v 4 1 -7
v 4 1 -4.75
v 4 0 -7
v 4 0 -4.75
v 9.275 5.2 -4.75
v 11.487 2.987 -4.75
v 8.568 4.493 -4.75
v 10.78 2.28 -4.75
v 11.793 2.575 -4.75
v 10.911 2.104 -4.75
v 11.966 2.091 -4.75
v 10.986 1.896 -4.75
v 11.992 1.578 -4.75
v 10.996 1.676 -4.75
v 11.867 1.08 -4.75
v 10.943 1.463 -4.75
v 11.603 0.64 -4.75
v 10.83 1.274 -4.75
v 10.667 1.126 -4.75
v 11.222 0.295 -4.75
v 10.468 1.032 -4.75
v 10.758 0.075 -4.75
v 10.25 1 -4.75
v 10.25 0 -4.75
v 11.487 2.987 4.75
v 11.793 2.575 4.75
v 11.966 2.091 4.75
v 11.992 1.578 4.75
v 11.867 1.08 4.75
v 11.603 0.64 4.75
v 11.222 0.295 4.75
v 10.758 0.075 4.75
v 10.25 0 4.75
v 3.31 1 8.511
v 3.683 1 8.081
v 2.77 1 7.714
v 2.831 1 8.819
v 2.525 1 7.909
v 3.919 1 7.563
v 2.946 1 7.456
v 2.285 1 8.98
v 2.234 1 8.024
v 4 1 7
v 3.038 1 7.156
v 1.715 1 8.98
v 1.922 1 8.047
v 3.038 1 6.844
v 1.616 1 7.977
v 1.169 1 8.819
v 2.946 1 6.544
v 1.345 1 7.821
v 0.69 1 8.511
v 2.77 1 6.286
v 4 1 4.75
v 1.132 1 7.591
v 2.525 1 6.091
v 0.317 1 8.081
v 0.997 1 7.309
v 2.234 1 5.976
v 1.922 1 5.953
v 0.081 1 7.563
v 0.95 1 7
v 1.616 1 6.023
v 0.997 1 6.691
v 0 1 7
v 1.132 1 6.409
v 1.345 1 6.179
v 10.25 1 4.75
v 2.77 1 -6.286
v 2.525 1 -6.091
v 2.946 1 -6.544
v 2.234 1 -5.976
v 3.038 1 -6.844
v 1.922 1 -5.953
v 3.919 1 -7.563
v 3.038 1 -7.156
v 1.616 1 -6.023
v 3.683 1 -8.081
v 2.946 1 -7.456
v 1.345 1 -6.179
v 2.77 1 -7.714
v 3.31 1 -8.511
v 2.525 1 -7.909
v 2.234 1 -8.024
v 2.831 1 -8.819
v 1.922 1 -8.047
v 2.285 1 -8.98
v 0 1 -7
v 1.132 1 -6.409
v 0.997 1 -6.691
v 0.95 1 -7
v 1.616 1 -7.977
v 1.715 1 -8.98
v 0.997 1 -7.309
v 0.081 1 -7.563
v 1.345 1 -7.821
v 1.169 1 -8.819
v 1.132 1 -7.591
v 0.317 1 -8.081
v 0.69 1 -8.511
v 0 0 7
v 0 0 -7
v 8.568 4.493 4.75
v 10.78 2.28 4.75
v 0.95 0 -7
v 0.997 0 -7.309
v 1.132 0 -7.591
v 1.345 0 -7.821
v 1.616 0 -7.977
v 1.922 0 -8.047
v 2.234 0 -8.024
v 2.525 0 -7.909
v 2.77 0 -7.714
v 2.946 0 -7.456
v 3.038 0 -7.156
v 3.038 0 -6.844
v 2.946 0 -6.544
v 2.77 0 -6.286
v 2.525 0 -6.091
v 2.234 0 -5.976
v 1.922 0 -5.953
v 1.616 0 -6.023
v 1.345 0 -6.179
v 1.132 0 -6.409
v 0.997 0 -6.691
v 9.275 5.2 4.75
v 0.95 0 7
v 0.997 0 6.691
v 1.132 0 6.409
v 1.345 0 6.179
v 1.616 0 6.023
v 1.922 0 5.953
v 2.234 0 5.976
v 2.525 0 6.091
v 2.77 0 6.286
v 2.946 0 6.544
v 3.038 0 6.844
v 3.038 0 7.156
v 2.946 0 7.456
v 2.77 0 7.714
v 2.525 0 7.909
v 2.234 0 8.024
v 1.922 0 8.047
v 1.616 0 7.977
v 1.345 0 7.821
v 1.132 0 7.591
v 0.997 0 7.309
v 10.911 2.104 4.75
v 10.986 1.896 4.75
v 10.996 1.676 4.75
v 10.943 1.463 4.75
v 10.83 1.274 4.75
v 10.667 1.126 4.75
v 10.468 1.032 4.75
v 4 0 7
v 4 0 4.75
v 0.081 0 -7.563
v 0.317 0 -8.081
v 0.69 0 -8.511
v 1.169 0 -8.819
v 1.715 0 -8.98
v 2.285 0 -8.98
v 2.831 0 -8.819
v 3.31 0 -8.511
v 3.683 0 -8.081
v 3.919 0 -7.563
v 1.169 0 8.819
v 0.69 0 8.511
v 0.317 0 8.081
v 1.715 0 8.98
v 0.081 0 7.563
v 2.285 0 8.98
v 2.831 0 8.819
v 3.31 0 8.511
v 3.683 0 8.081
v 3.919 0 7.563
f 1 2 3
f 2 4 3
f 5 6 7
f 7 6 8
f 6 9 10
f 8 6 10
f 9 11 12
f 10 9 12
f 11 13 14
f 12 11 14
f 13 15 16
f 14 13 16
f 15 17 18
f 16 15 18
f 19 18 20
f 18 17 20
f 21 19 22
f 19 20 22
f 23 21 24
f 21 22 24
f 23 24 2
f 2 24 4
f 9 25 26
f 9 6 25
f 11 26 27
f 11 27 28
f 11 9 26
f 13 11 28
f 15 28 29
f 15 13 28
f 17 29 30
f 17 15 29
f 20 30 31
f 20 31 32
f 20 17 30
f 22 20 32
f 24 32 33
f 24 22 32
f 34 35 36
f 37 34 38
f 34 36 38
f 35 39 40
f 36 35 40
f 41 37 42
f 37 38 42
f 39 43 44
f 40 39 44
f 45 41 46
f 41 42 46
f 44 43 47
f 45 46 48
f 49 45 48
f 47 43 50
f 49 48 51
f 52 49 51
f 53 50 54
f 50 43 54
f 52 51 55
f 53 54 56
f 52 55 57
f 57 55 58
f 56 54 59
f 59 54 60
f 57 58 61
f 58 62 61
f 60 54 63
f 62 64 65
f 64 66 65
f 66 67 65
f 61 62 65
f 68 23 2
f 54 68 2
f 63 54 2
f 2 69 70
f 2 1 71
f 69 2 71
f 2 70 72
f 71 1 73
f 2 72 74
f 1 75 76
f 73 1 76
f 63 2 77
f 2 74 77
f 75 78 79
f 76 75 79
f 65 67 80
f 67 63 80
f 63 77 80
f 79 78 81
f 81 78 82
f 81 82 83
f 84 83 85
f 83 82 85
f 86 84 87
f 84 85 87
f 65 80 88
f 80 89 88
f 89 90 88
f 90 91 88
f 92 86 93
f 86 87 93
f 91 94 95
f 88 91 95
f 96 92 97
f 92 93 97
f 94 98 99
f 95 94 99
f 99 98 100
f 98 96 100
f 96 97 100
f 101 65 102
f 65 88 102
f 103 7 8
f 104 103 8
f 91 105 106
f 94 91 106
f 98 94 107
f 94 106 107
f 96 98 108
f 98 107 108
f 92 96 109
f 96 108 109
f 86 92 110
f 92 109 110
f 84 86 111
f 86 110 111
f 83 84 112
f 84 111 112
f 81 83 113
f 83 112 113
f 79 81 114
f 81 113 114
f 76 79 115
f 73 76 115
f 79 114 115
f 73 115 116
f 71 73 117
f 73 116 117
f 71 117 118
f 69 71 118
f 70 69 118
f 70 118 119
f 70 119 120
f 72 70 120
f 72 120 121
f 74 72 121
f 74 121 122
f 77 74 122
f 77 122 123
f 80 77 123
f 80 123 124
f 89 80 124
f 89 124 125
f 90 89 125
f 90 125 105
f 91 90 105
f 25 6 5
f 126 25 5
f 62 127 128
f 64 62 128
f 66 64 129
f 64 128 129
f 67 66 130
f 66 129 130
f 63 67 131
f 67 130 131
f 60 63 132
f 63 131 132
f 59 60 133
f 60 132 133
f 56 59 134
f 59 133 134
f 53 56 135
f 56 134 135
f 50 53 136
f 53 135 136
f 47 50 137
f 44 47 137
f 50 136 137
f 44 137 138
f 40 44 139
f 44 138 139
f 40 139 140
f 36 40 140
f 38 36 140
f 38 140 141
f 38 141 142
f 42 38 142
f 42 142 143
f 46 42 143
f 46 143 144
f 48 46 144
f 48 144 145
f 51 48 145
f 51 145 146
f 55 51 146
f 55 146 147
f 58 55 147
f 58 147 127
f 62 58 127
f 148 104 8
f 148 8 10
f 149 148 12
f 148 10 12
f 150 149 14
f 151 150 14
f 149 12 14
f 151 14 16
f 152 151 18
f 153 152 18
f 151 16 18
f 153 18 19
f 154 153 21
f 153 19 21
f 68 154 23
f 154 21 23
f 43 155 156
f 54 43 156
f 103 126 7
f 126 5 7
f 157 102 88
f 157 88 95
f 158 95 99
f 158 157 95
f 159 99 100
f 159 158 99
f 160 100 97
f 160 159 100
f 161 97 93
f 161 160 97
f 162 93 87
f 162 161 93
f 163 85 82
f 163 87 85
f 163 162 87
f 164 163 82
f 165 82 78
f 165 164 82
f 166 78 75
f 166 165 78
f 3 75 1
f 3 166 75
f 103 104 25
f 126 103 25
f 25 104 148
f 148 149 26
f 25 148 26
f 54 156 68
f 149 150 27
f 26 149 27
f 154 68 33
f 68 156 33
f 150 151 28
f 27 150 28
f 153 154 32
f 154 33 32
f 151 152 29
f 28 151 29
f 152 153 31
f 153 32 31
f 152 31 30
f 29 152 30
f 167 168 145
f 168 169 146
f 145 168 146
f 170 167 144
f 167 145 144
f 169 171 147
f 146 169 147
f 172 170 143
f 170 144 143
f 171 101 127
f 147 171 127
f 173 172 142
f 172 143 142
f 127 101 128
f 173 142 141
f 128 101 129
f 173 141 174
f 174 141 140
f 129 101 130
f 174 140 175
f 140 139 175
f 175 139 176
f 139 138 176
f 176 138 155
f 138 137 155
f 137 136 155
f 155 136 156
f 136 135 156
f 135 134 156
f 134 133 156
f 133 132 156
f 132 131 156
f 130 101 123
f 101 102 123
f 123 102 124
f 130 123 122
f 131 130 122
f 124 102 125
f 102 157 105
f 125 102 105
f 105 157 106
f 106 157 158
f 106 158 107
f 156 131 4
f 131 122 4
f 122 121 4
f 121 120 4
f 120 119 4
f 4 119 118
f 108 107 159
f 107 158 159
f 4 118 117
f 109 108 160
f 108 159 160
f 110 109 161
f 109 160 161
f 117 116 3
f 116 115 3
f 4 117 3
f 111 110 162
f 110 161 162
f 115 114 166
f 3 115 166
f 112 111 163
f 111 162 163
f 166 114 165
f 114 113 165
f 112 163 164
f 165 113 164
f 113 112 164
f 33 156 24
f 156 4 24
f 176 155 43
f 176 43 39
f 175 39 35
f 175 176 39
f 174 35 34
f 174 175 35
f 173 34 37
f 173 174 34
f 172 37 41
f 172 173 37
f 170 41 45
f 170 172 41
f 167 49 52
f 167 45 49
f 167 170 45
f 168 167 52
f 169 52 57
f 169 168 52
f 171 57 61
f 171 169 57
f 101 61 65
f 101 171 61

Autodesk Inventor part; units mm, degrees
sketch "Sketch_1" plane through (0, 0, 0) normal (0, 0, 1) x (1, 0, 0)
  line L0 (0, 1) -> (0, 0)
  line L1 (0, 0) -> (10.25, 0)
  arc A0 (10.25, 0) -> (11.4874, 2.9874) centre (10.25, 1.75) ccw
  line L2 (11.4874, 2.9874) -> (9.2749, 5.2)
  line L3 (9.2749, 5.2) -> (8.5678, 4.4929)
  line L4 (8.5678, 4.4929) -> (10.7803, 2.2803)
  arc A1 (10.25, 1) -> (10.7803, 2.2803) centre (10.25, 1.75) ccw
  line L5 (10.25, 1) -> (0, 1)
extrude "Extrusion1" add sketch "Sketch_1" along normal mid plane 18
sketch "Sketch_2" plane through (0, 0, 0) normal (0, 1, 0) x (-1, 0, 0)
  line L0 (2, 11) -> (-16, 11)
  line L1 (-16, 11) -> (-16, -12)
  line L2 (-16, -12) -> (2, -12)
  line L3 (2, -12) -> (2, 11)
  line L4 (0, -7) -> (0, 7)
  arc A0 (0, 7) -> (-4, 7) centre (-2, 7) ccw
  line L5 (-4, 7) -> (-4, 4.75)
  line L6 (-4, 4.75) -> (-12, 4.75)
  line L7 (-12, 4.75) -> (-12, -4.75)
  line L8 (-12, -4.75) -> (-4, -4.75)
  line L9 (-4, -4.75) -> (-4, -7)
  arc A1 (-4, -7) -> (0, -7) centre (-2, -7) ccw
extrude "Extrusion2" cut sketch "Sketch_2" along normal mid plane 18
sketch "Sketch_3" plane through (0, 0, 0) normal (0, 1, 0) x (-1, 0, 0)
  circle A0 centre (-2, -7) radius 1.05
extrude "Extrusion3" cut sketch "Sketch_3" along normal mid plane 18
sketch "Sketch_4" plane through (0, 0, 0) normal (0, 1, 0) x (-1, 0, 0)
  circle A0 centre (-2, 7) radius 1.05
extrude "Extrusion4" cut sketch "Sketch_4" along normal mid plane 18
ref_plane "C_XY" through (10.1565, 1.75, 0) normal (0, 0, 1) x (1, 0, 0)
ref_plane "C_YZ" through (10.1565, 1.75, 0) normal (1, 0, 0) x (0, 1, 0)
ref_plane "C_ZX" through (10.1565, 1.75, 0) normal (0, 1, 0) x (0, 0, 1)
properties part number "PKWS1_s"
